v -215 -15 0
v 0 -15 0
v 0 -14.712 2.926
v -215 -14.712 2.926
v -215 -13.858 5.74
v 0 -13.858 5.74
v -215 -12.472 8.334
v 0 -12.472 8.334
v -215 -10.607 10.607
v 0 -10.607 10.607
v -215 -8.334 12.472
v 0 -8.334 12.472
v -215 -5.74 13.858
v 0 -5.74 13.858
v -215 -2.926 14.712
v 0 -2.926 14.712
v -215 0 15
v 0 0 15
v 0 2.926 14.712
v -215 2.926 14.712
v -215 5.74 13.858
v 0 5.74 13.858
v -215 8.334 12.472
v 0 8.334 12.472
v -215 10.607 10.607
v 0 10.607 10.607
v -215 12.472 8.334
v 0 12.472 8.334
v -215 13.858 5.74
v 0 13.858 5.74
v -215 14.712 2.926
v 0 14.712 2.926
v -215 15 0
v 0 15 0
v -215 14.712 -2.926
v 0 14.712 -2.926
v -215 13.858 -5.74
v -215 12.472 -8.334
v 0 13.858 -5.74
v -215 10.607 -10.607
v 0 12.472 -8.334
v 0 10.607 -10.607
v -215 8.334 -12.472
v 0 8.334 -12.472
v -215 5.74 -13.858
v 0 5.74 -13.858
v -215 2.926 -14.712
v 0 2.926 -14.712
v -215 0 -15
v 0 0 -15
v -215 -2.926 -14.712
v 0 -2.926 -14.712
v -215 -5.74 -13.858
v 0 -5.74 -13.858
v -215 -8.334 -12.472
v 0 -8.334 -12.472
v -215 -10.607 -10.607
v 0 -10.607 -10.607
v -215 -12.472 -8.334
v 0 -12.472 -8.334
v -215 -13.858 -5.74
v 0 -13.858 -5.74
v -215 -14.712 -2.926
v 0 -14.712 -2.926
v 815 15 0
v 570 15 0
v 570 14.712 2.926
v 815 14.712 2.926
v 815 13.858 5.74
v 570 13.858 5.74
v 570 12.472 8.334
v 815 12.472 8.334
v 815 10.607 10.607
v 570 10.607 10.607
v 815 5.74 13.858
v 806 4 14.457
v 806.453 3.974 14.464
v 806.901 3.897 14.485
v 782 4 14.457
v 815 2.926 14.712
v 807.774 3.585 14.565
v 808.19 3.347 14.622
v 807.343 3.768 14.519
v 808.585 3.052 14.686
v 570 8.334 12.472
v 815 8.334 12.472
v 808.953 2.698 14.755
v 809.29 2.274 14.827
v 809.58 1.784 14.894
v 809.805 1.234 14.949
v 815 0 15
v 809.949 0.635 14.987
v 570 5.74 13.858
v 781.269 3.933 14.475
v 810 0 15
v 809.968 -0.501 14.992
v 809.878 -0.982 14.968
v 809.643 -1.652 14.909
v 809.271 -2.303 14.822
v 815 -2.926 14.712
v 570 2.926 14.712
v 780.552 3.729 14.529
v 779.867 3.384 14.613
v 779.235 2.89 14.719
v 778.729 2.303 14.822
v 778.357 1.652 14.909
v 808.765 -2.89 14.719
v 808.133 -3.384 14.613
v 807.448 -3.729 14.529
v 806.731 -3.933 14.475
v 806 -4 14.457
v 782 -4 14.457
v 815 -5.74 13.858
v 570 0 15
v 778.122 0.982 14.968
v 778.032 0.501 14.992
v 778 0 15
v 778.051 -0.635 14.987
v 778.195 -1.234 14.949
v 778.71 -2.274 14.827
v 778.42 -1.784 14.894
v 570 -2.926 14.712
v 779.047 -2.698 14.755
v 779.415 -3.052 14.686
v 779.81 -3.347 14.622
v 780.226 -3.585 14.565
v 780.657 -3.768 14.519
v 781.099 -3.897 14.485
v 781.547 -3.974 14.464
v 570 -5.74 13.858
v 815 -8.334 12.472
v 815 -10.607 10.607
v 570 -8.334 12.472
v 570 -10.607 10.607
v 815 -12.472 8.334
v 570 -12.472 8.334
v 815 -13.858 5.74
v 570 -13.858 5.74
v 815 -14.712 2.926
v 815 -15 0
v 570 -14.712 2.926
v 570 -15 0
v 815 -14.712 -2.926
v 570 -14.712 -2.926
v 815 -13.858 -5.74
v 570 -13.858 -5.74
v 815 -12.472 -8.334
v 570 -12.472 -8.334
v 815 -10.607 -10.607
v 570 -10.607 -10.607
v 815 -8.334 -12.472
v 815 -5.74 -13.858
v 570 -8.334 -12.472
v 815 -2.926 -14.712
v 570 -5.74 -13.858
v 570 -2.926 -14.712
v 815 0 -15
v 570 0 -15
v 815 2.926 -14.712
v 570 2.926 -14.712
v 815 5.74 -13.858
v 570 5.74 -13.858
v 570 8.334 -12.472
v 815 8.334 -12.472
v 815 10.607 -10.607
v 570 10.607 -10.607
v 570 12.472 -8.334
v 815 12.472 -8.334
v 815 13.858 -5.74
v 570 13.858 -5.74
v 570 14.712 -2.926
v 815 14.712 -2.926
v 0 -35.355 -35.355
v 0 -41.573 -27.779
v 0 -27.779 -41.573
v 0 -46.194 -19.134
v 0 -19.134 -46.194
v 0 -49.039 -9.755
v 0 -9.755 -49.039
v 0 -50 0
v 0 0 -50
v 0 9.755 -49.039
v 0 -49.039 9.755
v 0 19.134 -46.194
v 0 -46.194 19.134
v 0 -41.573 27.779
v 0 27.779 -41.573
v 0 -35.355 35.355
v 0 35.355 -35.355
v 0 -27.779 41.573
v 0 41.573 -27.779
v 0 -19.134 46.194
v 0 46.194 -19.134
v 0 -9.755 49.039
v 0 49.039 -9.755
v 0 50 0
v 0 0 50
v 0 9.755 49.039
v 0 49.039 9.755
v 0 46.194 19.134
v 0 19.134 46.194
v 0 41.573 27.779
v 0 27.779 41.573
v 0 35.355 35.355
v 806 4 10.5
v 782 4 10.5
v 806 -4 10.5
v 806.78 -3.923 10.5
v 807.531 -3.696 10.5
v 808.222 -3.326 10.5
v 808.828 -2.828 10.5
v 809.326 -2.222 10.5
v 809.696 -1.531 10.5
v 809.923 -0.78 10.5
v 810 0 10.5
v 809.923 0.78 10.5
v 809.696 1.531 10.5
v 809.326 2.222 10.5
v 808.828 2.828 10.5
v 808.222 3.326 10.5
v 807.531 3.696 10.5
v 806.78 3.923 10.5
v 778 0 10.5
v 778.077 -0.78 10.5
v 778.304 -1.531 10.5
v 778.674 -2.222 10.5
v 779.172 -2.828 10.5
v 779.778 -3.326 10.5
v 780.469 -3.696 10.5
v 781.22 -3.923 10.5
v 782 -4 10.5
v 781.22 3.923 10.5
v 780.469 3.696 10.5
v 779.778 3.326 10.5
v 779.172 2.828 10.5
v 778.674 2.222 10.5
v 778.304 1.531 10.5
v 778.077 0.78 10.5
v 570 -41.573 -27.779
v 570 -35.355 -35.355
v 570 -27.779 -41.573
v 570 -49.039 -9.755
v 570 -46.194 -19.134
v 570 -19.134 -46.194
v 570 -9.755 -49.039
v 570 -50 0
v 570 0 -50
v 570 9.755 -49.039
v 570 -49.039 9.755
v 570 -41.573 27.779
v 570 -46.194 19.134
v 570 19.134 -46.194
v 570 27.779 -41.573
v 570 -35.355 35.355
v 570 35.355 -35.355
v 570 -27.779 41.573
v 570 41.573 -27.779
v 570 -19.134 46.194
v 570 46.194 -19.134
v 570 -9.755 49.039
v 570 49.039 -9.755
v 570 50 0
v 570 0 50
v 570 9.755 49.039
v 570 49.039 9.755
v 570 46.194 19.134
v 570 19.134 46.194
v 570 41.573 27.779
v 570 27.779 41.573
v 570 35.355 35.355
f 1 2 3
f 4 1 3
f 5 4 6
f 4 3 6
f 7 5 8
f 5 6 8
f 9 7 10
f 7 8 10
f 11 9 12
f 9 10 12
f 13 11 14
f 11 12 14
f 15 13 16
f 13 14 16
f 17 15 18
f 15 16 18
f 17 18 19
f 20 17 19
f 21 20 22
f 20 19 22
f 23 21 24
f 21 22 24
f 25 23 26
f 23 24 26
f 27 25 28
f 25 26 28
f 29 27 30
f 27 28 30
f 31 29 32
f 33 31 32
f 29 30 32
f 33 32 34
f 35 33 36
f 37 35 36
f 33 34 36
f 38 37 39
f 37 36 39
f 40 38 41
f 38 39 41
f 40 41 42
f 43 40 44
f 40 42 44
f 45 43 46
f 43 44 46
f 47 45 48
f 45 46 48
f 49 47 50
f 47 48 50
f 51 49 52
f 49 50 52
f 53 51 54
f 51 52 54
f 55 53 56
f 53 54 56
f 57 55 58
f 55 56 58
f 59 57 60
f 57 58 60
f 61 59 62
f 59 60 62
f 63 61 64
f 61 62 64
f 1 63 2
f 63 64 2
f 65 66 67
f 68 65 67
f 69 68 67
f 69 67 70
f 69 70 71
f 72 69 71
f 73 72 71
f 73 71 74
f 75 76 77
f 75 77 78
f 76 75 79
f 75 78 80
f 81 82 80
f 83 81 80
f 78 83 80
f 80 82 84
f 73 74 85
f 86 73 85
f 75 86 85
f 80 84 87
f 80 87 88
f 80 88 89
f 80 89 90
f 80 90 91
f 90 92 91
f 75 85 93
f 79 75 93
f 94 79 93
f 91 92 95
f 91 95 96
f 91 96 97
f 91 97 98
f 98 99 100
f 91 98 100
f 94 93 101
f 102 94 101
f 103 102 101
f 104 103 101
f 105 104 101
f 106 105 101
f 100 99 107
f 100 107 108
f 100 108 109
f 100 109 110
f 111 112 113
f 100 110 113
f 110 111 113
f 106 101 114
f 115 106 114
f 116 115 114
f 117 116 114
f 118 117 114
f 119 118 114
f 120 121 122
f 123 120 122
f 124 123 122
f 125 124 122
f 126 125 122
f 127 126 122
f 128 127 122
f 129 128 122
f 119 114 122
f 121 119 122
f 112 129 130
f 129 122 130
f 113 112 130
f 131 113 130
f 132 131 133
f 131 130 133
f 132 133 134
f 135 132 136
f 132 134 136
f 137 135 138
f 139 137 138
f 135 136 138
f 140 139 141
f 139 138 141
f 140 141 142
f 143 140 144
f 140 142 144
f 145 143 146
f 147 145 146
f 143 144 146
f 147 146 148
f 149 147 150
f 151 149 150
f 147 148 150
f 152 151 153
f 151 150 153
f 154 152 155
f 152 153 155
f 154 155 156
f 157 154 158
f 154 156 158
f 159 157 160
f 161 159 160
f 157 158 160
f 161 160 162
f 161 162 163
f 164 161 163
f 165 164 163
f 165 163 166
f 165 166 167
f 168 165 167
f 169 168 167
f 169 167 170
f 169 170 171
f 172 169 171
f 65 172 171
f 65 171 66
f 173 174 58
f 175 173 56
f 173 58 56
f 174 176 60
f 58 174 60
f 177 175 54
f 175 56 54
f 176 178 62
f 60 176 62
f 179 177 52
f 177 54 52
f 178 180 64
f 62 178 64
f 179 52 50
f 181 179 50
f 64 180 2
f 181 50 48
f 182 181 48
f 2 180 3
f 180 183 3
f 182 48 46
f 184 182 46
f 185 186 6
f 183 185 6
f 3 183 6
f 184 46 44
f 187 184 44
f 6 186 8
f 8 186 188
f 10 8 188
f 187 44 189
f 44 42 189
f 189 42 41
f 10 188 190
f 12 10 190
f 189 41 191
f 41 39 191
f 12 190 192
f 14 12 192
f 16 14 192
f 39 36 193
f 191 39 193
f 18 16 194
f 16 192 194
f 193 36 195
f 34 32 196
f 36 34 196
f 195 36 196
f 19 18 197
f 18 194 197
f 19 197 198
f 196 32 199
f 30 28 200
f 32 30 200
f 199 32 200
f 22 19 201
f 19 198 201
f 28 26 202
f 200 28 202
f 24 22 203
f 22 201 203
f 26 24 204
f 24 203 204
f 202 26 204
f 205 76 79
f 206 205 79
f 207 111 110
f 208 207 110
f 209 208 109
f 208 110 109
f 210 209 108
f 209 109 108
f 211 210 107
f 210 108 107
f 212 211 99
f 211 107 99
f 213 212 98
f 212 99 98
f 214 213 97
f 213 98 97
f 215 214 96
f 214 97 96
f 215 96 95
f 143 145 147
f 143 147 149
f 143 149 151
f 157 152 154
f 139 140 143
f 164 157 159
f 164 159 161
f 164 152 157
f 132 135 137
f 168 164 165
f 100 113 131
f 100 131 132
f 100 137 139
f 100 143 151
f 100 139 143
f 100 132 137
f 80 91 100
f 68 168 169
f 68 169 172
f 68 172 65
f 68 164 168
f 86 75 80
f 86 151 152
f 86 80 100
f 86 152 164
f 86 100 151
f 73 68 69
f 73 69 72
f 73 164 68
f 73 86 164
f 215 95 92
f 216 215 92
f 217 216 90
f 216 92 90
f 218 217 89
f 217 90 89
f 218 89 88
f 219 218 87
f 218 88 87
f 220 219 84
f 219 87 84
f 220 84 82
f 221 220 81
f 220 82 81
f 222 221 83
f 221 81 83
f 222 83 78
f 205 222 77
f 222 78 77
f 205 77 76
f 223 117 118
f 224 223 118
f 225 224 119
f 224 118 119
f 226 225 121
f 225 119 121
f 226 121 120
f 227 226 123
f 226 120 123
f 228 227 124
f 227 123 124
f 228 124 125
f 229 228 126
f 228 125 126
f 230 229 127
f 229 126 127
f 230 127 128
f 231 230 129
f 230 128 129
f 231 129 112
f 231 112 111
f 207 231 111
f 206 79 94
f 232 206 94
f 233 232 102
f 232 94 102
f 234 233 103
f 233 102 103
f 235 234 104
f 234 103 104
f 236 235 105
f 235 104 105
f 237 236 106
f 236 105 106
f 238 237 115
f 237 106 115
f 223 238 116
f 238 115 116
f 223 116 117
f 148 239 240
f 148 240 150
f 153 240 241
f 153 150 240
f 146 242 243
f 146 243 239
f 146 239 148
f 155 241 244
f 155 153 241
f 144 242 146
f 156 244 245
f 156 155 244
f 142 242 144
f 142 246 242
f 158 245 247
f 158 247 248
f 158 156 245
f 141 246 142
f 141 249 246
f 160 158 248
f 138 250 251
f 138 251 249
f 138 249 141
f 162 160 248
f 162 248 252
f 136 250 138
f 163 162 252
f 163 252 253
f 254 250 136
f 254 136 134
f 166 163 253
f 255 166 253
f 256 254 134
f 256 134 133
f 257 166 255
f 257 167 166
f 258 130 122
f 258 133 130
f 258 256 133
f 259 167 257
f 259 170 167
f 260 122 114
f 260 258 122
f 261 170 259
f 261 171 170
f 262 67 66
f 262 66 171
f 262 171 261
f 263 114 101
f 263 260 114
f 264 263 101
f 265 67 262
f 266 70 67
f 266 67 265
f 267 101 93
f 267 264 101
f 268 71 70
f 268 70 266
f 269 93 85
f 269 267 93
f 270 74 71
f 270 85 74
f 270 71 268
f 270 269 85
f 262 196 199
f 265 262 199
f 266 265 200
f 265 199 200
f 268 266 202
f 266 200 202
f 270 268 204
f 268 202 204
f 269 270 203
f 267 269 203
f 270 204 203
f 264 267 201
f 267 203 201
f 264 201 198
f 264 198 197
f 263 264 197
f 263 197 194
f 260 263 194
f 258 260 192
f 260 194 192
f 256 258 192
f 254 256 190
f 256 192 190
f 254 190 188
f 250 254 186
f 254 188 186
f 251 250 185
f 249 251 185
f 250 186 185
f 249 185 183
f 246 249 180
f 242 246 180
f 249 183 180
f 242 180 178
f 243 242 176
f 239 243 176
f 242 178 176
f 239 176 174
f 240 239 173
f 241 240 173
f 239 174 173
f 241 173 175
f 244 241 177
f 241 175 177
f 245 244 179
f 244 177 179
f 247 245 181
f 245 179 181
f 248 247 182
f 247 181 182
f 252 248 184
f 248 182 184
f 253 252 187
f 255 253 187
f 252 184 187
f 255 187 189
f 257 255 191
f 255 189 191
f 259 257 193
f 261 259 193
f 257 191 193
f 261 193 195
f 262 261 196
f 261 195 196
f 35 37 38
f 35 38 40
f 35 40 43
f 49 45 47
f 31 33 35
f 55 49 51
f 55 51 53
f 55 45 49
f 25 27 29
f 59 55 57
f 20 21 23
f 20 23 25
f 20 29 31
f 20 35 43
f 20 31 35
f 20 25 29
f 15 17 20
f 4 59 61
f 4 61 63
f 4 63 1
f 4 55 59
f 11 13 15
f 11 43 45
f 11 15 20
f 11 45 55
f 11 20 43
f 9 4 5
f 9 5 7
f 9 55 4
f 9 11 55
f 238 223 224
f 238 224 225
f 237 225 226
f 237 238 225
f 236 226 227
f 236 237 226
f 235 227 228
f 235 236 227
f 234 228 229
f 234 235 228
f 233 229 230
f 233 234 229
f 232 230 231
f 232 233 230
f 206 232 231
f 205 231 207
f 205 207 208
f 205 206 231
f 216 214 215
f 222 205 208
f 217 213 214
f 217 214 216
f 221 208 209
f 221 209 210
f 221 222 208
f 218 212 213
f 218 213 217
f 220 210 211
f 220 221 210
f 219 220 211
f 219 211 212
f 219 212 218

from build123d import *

# Parameters (mm, degrees)
F0_R     = 50
F1_DEPTH = 570
F2_R     = 15
F3_DEPTH = 215
F4_R     = 15
F5_DEPTH = 245
F8_DEPTH = 4.5


with BuildPart() as f1:
    # F0 (on Right) → F1 (new body)
    with BuildSketch(Plane.YZ):
        Circle(F0_R)
    extrude(amount=F1_DEPTH)

    # F2 (on face) → F3 (join)
    with BuildSketch(Plane(origin=(0, 0, 0), x_dir=(0, -1, 0), z_dir=(-1, 0, 0))):
        Circle(F2_R)
    extrude(amount=F3_DEPTH)

    # F4 (on face) → F5 (join)
    with BuildSketch(Plane.YZ.offset(570)):
        Circle(F4_R)
    extrude(amount=F5_DEPTH)

    # F7 (on offset) → F8 (cut)
    with BuildSketch(Plane.XY.offset(15)):
        with BuildLine():
            ThreePointArc((810, 0), (808.828427, 2.828427), (806, 4))
            Line((806, 4), (782, 4))
            ThreePointArc((782, 4), (779.171573, 2.828427), (778, 0))
            ThreePointArc((778, 0), (779.171573, -2.828427), (782, -4))
            Line((782, -4), (806, -4))
            ThreePointArc((806, -4), (808.828427, -2.828427), (810, 0))
        make_face()
    extrude(amount=-F8_DEPTH, mode=Mode.SUBTRACT)


solid = f1.part
